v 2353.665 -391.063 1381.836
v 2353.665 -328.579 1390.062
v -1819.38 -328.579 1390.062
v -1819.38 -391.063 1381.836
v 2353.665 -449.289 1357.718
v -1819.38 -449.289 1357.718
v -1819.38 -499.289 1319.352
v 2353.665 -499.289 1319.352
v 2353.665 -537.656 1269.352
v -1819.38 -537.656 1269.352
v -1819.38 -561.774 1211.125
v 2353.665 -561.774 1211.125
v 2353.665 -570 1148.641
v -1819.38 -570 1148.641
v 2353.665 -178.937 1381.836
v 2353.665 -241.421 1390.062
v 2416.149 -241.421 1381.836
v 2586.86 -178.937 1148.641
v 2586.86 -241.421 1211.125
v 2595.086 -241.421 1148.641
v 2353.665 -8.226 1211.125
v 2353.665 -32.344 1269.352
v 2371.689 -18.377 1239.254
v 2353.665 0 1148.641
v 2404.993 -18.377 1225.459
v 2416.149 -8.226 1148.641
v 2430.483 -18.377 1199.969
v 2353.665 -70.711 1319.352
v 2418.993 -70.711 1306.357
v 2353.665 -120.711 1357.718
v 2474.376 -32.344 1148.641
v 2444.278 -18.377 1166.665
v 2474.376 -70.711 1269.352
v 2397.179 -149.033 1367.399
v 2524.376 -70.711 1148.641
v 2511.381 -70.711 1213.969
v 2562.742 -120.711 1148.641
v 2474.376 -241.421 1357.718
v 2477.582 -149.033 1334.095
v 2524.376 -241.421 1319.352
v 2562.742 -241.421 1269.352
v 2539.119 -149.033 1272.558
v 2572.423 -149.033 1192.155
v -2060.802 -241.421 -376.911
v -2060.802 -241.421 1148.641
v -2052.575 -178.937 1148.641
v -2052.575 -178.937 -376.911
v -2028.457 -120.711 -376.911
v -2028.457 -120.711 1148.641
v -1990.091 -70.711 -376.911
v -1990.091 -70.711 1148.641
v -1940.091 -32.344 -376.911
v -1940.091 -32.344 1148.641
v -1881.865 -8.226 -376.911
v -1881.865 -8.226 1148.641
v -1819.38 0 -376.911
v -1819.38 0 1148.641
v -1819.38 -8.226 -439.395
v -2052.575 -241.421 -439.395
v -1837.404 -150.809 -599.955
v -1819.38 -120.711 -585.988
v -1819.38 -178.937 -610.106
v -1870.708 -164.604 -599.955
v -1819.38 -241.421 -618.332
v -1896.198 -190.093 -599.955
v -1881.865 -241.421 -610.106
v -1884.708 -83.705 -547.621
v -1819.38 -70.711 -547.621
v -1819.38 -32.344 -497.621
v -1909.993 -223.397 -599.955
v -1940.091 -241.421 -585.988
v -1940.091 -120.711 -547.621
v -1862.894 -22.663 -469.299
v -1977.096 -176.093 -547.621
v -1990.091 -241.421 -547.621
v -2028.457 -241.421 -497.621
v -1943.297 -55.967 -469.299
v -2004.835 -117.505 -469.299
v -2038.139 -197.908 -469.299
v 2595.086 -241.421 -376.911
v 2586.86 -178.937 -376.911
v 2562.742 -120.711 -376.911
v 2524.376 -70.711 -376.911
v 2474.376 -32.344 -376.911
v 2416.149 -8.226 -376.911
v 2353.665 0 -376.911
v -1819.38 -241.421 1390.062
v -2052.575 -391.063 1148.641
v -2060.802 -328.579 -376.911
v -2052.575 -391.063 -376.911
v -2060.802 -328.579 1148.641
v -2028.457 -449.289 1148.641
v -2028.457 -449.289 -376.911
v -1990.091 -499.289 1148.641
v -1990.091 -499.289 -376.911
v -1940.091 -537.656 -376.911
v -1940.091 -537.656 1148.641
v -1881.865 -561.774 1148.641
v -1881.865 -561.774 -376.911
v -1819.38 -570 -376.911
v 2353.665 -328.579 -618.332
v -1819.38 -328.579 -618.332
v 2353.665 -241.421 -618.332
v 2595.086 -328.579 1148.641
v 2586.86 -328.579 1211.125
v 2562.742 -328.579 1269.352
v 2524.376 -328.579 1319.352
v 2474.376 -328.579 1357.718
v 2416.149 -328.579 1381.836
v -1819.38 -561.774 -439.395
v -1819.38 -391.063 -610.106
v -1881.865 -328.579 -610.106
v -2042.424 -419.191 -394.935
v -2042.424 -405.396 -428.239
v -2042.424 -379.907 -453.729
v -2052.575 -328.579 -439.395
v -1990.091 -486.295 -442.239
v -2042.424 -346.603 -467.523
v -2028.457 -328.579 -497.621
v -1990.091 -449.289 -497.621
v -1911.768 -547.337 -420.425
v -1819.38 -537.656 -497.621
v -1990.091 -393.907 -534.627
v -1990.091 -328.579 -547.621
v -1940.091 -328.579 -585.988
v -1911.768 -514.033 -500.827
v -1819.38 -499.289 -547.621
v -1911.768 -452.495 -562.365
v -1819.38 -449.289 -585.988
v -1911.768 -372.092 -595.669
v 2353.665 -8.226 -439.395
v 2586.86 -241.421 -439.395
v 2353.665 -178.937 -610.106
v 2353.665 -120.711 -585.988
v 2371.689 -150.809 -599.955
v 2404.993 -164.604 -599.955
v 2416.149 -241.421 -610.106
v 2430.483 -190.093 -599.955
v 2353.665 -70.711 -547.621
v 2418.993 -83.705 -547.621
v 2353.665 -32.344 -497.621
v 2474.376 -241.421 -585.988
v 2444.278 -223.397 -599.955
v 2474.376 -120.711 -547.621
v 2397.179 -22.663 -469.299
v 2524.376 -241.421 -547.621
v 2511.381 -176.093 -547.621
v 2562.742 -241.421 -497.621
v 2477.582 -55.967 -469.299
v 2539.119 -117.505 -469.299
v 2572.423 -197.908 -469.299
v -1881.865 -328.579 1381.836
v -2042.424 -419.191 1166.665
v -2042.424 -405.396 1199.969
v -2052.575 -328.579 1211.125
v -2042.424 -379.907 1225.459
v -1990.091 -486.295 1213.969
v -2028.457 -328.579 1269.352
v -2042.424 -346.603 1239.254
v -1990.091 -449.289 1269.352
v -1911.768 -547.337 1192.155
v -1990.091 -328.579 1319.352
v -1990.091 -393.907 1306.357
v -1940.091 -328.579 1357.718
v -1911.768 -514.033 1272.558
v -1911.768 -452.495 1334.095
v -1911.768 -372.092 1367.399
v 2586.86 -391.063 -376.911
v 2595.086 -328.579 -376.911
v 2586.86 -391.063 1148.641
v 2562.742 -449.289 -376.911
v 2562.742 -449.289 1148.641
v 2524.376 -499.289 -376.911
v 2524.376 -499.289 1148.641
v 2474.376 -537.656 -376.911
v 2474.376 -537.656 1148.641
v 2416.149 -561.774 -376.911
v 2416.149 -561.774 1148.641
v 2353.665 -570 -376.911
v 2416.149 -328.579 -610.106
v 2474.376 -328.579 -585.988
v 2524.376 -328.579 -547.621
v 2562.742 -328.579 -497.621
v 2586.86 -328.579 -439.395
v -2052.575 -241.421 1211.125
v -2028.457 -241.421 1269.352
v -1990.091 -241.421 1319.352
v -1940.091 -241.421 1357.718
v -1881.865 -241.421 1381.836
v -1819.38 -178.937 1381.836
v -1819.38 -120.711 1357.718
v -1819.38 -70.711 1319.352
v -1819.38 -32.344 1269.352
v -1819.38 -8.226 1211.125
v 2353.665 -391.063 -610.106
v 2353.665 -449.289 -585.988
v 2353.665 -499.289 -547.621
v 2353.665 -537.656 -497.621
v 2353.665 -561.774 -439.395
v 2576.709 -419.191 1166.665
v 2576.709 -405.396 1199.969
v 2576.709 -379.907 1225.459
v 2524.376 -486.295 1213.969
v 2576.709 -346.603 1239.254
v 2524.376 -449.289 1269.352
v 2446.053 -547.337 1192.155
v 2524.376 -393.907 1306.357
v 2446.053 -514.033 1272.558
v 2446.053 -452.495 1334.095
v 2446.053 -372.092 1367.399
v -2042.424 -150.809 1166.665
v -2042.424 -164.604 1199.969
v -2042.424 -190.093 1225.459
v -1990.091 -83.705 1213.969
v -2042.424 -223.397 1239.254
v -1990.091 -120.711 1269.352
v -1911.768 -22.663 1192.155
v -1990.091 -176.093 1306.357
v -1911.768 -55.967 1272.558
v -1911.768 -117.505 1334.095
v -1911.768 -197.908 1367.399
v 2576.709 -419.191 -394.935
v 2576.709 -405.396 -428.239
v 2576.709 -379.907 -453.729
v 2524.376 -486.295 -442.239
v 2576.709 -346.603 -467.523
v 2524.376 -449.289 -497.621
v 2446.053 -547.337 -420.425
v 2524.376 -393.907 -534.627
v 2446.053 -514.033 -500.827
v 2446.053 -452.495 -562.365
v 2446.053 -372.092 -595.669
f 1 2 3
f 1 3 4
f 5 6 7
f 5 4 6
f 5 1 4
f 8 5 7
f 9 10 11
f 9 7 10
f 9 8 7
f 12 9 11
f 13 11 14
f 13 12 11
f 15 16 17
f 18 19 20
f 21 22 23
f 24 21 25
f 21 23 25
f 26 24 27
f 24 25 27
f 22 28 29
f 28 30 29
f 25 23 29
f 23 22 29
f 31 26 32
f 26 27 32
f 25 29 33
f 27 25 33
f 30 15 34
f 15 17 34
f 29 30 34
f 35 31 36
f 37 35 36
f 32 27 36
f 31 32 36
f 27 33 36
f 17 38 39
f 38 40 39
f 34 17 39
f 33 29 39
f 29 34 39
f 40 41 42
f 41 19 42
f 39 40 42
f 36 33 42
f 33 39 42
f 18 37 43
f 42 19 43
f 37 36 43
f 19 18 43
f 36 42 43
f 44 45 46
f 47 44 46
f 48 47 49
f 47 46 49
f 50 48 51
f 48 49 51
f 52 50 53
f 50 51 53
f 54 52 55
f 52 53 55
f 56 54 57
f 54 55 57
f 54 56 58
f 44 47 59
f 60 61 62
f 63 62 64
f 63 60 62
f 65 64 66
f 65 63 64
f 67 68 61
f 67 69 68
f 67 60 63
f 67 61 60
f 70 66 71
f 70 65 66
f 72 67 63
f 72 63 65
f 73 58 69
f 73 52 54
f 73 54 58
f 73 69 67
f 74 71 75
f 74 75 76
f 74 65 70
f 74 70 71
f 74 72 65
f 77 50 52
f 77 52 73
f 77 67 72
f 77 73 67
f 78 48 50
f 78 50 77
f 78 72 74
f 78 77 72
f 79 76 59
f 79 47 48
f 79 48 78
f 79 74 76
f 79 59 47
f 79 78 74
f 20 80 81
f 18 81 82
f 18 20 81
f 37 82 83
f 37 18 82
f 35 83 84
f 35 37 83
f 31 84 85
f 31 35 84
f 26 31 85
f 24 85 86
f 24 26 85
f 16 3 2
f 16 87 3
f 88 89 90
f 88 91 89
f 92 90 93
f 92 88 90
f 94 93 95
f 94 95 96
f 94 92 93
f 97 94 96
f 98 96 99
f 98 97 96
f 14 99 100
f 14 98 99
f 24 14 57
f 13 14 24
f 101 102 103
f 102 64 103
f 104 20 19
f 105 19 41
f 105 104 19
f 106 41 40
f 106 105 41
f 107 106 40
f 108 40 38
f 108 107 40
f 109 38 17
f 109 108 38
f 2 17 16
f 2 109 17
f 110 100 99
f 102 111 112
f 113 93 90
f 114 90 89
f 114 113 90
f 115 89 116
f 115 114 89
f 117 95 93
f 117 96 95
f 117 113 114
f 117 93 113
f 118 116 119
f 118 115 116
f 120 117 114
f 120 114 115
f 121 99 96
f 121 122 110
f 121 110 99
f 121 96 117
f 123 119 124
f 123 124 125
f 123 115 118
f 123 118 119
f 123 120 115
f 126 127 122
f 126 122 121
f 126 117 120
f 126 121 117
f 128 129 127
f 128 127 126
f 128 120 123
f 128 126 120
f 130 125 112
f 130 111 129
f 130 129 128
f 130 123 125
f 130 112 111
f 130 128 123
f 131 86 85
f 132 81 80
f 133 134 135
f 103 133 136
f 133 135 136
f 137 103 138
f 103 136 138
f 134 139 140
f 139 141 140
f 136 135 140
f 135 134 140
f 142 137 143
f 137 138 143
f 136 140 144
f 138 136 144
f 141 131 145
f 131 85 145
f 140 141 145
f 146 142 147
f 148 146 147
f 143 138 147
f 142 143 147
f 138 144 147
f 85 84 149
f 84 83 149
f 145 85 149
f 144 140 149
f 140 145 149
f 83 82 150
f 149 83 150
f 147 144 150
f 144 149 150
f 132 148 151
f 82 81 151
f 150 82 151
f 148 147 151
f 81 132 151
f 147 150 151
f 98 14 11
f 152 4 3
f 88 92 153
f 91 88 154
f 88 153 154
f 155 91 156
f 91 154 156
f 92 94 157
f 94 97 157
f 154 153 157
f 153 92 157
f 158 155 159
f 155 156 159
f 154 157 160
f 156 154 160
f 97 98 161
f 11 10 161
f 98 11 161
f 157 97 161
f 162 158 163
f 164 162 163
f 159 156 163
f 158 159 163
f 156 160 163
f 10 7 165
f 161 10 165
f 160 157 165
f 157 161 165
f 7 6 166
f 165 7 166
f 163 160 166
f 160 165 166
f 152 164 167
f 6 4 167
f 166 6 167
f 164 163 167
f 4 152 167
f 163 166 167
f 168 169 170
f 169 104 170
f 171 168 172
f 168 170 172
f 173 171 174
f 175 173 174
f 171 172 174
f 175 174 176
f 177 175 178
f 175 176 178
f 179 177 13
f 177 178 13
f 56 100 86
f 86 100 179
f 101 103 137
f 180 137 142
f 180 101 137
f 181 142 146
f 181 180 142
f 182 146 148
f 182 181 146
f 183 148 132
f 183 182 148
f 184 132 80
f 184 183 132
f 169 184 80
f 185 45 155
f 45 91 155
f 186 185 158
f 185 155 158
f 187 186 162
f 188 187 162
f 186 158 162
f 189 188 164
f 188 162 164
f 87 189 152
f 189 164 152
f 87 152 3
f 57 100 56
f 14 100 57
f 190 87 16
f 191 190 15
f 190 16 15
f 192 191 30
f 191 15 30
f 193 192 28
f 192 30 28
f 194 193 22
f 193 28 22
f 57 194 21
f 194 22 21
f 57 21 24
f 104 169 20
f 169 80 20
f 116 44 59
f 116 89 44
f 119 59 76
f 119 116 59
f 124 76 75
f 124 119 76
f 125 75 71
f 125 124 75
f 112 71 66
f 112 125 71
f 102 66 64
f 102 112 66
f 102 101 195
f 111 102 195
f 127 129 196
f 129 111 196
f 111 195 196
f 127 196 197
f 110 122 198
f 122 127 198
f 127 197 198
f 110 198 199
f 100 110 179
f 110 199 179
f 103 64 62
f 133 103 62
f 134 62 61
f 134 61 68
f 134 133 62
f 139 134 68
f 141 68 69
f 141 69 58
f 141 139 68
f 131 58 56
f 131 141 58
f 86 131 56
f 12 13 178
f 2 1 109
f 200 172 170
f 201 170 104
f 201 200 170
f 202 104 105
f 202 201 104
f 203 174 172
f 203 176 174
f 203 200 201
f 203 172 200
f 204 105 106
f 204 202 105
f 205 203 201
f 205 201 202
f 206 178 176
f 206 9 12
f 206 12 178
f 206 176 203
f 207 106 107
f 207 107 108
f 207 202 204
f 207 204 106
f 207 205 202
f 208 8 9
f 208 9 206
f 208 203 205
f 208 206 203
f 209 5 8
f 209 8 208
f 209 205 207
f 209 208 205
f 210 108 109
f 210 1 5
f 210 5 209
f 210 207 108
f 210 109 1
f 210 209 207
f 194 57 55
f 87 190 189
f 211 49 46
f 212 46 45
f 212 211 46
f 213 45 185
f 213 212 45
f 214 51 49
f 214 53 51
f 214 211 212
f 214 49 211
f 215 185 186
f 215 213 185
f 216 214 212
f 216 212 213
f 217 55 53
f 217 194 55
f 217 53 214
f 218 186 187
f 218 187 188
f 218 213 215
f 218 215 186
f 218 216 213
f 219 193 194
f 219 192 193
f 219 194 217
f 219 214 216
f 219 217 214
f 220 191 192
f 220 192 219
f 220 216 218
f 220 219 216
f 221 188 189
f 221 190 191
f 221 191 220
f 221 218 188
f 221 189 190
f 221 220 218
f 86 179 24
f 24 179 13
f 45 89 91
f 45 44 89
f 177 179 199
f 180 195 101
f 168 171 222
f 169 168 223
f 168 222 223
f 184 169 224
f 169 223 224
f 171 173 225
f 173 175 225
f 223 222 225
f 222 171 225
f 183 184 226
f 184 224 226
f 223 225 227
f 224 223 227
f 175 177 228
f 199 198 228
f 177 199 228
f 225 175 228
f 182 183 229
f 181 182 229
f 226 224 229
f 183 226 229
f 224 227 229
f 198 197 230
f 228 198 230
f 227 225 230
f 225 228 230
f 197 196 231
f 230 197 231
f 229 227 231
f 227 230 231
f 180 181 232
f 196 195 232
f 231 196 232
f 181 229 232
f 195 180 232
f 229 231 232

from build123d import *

# Parameters (mm, degrees)
F0_W     = 4655.8878421783
F0_H     = 2008.3943009377
F1_DEPTH = 570
F2_R     = 241.4213562373
F3_W     = 4173.0451297037
F3_H     = 1525.551588463
F4_DEPTH = 1630


with BuildPart() as f1:
    # F0 (on Front) → F1 (new body)
    with BuildSketch(Plane.XZ):
        with Locations((267.1424150467, 385.8650624752)):
            Rectangle(F0_W, F0_H)
    extrude(amount=F1_DEPTH)

    # F2
    f2_edges = [f1.edges().sort_by_distance(p)[0] for p in [
        (267.142415, -570, 1390.062213),
        (267.142415, -570, -618.332088),
        (-2060.801506, -570, 385.865062),
        (2595.086336, -570, 385.865062),
        (2595.086336, -285, 1390.062213),
        (267.142415, 0, 1390.062213),
        (-2060.801506, 0, 385.865062),
        (2595.086336, 0, 385.865062),
        (267.142415, 0, -618.332088),
        (2595.086336, -285, -618.332088),
        (-2060.801506, -285, 1390.062213),
        (-2060.801506, -285, -618.332088),
    ]]
    fillet(f2_edges, radius=F2_R)

    # F3 (on face) → F4 (cut)
    with BuildSketch(Plane.XZ.offset(570)):
        with Locations((267.1424150467, 385.8650624752)):
            Rectangle(F3_W, F3_H)
    extrude(amount=-F4_DEPTH, mode=Mode.SUBTRACT)


solid = f1.part
